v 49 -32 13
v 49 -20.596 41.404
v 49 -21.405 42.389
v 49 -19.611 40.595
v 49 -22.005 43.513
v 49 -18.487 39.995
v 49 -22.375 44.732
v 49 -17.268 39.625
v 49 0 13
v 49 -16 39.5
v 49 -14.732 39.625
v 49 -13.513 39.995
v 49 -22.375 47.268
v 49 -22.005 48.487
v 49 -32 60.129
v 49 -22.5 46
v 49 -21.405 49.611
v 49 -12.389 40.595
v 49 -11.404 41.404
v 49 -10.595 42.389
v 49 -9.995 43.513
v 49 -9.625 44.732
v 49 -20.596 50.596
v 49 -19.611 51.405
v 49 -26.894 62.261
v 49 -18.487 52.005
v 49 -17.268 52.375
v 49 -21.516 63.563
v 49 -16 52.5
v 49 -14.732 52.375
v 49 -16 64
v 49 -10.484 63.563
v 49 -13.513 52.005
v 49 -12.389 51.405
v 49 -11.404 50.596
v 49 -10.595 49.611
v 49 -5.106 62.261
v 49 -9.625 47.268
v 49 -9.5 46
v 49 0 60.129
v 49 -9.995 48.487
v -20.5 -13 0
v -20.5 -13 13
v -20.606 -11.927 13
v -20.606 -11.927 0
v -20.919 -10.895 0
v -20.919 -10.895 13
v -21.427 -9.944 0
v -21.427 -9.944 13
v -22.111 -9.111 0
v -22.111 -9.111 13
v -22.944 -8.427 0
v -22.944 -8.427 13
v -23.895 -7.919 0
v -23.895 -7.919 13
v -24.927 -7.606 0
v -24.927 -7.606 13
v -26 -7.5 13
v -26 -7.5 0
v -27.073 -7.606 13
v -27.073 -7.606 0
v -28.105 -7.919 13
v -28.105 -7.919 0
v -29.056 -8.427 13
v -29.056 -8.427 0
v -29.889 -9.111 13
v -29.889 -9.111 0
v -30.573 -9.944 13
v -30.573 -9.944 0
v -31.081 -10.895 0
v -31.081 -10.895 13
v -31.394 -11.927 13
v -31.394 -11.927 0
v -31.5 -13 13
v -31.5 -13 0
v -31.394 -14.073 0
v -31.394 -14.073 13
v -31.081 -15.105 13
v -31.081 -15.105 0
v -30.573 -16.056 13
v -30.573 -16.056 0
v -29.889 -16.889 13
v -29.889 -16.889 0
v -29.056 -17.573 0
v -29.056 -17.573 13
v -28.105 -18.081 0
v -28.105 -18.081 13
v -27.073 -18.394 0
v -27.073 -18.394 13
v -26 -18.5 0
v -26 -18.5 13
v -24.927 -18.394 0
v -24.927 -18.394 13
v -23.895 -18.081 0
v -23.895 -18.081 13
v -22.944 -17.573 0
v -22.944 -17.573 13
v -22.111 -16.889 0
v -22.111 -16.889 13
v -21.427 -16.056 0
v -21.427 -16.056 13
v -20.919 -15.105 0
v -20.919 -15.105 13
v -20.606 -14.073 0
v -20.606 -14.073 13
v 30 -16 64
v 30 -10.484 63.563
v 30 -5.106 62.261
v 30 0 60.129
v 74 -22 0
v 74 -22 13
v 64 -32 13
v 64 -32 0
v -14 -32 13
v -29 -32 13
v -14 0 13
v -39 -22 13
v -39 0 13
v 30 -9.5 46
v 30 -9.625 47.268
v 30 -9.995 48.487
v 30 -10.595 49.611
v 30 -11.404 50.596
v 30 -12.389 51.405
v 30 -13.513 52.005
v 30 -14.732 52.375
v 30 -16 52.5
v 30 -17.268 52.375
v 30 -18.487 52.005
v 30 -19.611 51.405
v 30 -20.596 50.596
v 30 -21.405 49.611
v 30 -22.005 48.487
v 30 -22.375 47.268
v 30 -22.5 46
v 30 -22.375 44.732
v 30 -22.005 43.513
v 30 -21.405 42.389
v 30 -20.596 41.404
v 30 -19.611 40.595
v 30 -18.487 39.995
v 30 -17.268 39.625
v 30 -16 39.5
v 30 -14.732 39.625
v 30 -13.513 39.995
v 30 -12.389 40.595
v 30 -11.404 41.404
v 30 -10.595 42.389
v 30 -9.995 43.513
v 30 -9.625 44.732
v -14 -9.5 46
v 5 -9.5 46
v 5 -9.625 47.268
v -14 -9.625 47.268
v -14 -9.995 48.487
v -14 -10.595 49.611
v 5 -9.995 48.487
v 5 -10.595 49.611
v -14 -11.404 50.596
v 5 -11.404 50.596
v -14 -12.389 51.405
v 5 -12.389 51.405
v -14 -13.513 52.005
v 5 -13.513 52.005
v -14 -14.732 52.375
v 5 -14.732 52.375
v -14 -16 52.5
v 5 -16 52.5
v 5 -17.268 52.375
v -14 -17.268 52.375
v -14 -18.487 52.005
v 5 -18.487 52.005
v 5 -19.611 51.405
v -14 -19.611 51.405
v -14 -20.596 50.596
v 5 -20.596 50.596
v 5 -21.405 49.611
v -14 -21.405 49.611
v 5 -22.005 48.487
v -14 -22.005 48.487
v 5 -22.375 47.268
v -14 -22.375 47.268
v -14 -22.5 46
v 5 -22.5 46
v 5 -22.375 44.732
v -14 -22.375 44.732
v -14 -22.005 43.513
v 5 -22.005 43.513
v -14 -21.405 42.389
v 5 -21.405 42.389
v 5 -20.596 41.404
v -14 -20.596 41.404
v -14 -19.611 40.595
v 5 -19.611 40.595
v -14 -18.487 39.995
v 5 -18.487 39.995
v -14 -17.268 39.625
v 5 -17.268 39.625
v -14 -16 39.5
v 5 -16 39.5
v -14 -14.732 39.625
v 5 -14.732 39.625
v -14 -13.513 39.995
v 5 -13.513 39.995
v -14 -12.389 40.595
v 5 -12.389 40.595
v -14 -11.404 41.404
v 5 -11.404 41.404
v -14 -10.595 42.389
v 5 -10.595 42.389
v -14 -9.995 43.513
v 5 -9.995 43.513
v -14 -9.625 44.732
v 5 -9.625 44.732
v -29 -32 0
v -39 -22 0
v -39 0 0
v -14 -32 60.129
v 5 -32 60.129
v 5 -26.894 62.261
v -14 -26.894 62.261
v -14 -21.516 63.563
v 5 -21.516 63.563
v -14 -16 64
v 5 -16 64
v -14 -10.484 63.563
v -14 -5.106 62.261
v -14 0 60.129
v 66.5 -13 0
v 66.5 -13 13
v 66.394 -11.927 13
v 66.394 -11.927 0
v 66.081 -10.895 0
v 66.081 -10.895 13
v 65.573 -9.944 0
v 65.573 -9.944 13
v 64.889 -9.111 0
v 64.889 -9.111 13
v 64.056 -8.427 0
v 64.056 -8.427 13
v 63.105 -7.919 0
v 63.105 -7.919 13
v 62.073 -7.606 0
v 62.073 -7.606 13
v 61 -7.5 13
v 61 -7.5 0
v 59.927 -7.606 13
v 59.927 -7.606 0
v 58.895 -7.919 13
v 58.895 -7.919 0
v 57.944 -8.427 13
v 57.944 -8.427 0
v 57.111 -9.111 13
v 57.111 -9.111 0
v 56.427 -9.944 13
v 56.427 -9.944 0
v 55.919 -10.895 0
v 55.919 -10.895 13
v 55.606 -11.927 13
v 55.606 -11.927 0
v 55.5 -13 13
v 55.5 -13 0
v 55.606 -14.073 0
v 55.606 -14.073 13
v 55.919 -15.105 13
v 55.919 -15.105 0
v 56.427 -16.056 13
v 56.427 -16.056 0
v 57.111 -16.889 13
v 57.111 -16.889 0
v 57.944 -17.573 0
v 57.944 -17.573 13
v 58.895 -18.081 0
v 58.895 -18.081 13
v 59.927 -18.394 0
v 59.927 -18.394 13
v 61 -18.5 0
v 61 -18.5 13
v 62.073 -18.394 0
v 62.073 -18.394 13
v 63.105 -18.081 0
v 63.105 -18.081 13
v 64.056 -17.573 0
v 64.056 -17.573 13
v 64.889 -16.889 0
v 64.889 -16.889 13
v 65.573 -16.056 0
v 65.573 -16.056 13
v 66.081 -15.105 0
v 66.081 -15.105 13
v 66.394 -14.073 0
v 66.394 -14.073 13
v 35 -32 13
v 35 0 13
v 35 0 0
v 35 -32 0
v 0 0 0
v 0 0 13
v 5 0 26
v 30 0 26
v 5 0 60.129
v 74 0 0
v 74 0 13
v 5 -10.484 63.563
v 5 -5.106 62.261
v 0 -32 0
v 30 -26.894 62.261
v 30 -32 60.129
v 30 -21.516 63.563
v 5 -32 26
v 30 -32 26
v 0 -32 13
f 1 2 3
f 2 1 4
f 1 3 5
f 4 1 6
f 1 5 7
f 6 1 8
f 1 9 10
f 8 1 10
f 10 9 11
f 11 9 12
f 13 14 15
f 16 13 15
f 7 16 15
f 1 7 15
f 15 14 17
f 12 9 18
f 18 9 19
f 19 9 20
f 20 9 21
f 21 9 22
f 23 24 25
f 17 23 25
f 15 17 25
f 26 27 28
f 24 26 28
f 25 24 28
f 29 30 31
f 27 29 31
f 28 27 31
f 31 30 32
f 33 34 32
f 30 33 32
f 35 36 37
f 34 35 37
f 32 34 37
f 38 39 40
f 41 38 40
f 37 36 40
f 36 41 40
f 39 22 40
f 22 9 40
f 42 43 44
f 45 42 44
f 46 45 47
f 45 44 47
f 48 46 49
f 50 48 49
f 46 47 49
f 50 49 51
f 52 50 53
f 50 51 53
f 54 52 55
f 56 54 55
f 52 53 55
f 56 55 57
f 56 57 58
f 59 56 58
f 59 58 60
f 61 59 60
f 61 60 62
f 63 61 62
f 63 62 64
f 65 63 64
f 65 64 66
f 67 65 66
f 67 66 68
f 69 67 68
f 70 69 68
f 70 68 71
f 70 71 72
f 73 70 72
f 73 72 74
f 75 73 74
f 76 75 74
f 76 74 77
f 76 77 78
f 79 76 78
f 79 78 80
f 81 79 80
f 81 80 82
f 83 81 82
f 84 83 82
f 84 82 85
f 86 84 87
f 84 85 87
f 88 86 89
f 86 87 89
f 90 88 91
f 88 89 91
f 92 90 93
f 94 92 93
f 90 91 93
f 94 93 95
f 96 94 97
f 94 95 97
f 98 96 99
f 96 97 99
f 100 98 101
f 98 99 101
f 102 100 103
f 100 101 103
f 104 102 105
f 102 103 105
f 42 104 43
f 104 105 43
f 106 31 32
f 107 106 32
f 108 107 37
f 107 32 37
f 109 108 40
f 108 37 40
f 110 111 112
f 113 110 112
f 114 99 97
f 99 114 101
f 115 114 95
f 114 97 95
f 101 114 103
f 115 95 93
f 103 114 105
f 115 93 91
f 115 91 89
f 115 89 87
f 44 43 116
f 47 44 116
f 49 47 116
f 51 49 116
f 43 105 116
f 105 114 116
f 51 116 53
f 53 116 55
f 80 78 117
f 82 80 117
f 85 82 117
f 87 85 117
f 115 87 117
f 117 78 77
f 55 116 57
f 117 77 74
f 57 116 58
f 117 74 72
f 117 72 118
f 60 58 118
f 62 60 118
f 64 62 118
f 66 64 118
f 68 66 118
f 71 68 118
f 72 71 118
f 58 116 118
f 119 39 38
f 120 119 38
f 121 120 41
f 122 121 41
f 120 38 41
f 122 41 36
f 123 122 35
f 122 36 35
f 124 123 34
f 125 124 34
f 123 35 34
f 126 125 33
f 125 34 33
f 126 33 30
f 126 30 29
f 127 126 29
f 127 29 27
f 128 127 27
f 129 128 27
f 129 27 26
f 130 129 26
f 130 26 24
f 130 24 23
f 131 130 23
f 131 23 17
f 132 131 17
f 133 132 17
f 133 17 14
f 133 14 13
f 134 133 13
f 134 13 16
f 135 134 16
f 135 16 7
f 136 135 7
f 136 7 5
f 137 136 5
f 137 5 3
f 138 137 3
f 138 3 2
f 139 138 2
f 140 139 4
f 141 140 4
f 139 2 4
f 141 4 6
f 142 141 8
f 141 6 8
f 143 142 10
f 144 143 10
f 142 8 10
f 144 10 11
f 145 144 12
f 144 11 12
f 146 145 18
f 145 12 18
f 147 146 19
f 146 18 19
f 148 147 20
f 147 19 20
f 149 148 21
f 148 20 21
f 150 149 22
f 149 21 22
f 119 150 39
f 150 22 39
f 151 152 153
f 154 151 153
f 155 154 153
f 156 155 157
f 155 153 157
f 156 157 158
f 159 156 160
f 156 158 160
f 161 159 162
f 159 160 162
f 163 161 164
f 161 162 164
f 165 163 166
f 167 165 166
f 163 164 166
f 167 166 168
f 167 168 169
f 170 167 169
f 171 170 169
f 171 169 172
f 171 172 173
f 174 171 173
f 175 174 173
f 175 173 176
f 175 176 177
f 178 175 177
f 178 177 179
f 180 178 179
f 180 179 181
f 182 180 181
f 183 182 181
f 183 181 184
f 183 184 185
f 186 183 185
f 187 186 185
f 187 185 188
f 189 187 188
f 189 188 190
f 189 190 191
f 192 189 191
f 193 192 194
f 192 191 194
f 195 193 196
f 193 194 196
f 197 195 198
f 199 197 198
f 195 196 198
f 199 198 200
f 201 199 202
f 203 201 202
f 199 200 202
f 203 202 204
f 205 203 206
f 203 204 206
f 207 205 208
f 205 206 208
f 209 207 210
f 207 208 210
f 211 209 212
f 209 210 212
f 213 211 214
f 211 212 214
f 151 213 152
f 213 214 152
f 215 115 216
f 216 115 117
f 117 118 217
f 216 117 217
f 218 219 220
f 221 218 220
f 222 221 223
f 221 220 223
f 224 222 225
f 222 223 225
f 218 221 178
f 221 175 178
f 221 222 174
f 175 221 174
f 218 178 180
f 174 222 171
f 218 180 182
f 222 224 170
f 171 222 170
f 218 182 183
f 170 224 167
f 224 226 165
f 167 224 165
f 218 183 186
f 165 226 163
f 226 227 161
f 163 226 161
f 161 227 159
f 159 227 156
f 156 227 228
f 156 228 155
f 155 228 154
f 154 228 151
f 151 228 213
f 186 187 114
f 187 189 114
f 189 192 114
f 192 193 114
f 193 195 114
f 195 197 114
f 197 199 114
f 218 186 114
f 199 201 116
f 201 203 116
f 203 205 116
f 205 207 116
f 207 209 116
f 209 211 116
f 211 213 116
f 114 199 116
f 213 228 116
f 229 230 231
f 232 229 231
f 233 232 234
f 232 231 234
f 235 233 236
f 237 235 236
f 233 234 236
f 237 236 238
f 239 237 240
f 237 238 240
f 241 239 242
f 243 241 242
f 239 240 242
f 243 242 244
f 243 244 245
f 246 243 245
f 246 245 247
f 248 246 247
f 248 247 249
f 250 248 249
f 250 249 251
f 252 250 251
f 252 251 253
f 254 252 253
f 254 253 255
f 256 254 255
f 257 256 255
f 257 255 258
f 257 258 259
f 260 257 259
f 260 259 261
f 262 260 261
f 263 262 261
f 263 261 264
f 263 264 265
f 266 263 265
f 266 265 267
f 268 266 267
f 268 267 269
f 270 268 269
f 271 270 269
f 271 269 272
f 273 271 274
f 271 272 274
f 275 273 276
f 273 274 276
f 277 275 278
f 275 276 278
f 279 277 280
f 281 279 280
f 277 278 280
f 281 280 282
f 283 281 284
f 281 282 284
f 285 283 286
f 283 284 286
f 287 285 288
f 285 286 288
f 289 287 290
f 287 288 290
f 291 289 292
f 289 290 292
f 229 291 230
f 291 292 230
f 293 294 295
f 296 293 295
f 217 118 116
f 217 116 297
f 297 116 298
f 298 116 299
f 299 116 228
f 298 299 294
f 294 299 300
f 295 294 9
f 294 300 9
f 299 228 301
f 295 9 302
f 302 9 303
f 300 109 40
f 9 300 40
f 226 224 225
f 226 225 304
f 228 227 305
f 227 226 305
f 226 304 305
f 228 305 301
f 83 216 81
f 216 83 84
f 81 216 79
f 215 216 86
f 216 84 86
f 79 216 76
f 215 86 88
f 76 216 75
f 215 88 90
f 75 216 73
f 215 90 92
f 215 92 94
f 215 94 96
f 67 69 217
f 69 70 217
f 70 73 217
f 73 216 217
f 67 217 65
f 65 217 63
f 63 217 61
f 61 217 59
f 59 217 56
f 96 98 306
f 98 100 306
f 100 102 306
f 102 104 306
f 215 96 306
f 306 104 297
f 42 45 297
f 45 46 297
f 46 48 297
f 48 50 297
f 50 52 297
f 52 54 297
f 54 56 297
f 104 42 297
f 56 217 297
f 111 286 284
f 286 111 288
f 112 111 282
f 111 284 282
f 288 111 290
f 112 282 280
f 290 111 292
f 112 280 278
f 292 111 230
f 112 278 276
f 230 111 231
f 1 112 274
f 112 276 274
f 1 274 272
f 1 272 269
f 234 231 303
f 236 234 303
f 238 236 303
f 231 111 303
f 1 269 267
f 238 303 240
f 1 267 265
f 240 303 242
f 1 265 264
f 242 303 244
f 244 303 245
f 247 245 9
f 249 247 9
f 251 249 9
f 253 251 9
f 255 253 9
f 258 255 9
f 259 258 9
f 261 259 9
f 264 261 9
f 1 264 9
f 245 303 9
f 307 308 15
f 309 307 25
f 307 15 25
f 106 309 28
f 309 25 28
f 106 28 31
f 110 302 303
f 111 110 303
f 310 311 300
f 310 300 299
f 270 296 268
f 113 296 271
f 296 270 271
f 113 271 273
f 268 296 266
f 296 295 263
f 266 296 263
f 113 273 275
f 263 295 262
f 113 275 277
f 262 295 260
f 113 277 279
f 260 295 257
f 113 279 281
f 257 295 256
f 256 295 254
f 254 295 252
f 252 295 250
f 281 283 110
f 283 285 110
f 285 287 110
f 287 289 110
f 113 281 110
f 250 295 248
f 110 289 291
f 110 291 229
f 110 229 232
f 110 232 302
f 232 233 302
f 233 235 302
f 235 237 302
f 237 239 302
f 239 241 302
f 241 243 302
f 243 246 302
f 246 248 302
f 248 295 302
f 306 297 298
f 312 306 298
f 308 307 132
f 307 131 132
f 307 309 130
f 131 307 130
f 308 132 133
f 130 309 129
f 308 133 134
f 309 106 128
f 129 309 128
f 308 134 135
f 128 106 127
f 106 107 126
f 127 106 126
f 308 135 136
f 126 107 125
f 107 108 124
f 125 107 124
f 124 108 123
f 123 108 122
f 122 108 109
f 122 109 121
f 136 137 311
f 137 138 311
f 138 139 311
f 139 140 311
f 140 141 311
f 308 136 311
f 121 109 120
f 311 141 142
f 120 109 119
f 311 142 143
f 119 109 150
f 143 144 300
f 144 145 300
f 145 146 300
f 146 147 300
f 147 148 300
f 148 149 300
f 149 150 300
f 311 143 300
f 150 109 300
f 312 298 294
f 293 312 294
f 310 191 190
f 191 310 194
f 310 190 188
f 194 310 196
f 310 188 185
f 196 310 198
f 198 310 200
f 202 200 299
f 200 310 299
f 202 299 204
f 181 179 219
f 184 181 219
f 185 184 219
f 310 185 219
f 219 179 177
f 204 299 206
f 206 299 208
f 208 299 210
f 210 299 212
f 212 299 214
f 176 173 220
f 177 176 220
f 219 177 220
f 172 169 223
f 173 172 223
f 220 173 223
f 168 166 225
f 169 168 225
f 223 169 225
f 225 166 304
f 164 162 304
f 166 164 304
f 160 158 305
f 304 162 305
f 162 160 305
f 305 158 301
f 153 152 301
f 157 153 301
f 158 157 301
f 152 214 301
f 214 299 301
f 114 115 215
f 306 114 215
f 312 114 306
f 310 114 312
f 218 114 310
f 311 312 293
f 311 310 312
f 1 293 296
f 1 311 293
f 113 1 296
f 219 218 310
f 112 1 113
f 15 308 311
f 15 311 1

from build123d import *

# Parameters (mm, degrees)
F1_DEPTH  = 32
F3_DEPTH  = 13.001
F4_R      = 5.5
F5_DEPTH  = 13.001
F6_R      = 6.5
F7_DEPTH  = 88.001
F9_DEPTH  = 88.001
F10_DEPTH = 88.001


with BuildPart() as f1:
    # F0 (on Front) → F1 (new body)
    with BuildSketch(Plane.XZ):
        Polygon((-39, 0), (0, 0), (0, 13), (35, 13), (35, 0), (74, 0), (74, 13), (49, 13), (49, 64), (30, 64), (30, 26), (5, 26), (5, 64), (-14, 64), (-14, 13), (-39, 13), align=None)
    extrude(amount=F1_DEPTH)

    # F2 (on face) → F3 (cut, through all)
    with BuildSketch(Plane.XY.offset(13)):
        Polygon((74, -22), (64, -32), (74, -32), align=None)
        Polygon((-39, -32), (-29, -32), (-39, -22), align=None)
    extrude(amount=-F3_DEPTH, mode=Mode.SUBTRACT)

    # F4 (on face) → F5 (cut, through all)
    with BuildSketch(Plane.XY.offset(13)):
        with Locations((-26, -13)):
            Circle(F4_R)
        with Locations((61, -13)):
            Circle(F4_R)
    extrude(amount=-F5_DEPTH, mode=Mode.SUBTRACT)

    # F6 (on face) → F7 (cut, through all)
    with BuildSketch(Plane.YZ.offset(49)):
        with Locations((-16, 46)):
            Circle(F6_R)
    extrude(amount=-F7_DEPTH, mode=Mode.SUBTRACT)

    # F8 (on face) → F9 (cut, through all)
    with BuildSketch(Plane.YZ.offset(49)):
        with BuildLine():
            ThreePointArc((-32, 60.128765), (-24.230833, 63.018427), (-16, 64))
            Line((-16, 64), (-32, 64))
            Line((-32, 64), (-32, 60.128765))
        make_face()
        with BuildLine():
            ThreePointArc((-16, 64), (-7.769167, 63.018427), (0, 60.128765))
            Line((0, 60.128765), (0, 64))
            Line((0, 64), (-16, 64))
        make_face()
    extrude(amount=-F9_DEPTH, mode=Mode.SUBTRACT)

    # F8 (on face) → F10 (cut, through all)
    with BuildSketch(Plane.YZ.offset(49)):
        with BuildLine():
            ThreePointArc((-32, 60.128765), (-24.230833, 63.018427), (-16, 64))
            Line((-16, 64), (-32, 64))
            Line((-32, 64), (-32, 60.128765))
        make_face()
        with BuildLine():
            ThreePointArc((-16, 64), (-7.769167, 63.018427), (0, 60.128765))
            Line((0, 60.128765), (0, 64))
            Line((0, 64), (-16, 64))
        make_face()
    extrude(amount=-F10_DEPTH, mode=Mode.SUBTRACT)


solid = f1.part
